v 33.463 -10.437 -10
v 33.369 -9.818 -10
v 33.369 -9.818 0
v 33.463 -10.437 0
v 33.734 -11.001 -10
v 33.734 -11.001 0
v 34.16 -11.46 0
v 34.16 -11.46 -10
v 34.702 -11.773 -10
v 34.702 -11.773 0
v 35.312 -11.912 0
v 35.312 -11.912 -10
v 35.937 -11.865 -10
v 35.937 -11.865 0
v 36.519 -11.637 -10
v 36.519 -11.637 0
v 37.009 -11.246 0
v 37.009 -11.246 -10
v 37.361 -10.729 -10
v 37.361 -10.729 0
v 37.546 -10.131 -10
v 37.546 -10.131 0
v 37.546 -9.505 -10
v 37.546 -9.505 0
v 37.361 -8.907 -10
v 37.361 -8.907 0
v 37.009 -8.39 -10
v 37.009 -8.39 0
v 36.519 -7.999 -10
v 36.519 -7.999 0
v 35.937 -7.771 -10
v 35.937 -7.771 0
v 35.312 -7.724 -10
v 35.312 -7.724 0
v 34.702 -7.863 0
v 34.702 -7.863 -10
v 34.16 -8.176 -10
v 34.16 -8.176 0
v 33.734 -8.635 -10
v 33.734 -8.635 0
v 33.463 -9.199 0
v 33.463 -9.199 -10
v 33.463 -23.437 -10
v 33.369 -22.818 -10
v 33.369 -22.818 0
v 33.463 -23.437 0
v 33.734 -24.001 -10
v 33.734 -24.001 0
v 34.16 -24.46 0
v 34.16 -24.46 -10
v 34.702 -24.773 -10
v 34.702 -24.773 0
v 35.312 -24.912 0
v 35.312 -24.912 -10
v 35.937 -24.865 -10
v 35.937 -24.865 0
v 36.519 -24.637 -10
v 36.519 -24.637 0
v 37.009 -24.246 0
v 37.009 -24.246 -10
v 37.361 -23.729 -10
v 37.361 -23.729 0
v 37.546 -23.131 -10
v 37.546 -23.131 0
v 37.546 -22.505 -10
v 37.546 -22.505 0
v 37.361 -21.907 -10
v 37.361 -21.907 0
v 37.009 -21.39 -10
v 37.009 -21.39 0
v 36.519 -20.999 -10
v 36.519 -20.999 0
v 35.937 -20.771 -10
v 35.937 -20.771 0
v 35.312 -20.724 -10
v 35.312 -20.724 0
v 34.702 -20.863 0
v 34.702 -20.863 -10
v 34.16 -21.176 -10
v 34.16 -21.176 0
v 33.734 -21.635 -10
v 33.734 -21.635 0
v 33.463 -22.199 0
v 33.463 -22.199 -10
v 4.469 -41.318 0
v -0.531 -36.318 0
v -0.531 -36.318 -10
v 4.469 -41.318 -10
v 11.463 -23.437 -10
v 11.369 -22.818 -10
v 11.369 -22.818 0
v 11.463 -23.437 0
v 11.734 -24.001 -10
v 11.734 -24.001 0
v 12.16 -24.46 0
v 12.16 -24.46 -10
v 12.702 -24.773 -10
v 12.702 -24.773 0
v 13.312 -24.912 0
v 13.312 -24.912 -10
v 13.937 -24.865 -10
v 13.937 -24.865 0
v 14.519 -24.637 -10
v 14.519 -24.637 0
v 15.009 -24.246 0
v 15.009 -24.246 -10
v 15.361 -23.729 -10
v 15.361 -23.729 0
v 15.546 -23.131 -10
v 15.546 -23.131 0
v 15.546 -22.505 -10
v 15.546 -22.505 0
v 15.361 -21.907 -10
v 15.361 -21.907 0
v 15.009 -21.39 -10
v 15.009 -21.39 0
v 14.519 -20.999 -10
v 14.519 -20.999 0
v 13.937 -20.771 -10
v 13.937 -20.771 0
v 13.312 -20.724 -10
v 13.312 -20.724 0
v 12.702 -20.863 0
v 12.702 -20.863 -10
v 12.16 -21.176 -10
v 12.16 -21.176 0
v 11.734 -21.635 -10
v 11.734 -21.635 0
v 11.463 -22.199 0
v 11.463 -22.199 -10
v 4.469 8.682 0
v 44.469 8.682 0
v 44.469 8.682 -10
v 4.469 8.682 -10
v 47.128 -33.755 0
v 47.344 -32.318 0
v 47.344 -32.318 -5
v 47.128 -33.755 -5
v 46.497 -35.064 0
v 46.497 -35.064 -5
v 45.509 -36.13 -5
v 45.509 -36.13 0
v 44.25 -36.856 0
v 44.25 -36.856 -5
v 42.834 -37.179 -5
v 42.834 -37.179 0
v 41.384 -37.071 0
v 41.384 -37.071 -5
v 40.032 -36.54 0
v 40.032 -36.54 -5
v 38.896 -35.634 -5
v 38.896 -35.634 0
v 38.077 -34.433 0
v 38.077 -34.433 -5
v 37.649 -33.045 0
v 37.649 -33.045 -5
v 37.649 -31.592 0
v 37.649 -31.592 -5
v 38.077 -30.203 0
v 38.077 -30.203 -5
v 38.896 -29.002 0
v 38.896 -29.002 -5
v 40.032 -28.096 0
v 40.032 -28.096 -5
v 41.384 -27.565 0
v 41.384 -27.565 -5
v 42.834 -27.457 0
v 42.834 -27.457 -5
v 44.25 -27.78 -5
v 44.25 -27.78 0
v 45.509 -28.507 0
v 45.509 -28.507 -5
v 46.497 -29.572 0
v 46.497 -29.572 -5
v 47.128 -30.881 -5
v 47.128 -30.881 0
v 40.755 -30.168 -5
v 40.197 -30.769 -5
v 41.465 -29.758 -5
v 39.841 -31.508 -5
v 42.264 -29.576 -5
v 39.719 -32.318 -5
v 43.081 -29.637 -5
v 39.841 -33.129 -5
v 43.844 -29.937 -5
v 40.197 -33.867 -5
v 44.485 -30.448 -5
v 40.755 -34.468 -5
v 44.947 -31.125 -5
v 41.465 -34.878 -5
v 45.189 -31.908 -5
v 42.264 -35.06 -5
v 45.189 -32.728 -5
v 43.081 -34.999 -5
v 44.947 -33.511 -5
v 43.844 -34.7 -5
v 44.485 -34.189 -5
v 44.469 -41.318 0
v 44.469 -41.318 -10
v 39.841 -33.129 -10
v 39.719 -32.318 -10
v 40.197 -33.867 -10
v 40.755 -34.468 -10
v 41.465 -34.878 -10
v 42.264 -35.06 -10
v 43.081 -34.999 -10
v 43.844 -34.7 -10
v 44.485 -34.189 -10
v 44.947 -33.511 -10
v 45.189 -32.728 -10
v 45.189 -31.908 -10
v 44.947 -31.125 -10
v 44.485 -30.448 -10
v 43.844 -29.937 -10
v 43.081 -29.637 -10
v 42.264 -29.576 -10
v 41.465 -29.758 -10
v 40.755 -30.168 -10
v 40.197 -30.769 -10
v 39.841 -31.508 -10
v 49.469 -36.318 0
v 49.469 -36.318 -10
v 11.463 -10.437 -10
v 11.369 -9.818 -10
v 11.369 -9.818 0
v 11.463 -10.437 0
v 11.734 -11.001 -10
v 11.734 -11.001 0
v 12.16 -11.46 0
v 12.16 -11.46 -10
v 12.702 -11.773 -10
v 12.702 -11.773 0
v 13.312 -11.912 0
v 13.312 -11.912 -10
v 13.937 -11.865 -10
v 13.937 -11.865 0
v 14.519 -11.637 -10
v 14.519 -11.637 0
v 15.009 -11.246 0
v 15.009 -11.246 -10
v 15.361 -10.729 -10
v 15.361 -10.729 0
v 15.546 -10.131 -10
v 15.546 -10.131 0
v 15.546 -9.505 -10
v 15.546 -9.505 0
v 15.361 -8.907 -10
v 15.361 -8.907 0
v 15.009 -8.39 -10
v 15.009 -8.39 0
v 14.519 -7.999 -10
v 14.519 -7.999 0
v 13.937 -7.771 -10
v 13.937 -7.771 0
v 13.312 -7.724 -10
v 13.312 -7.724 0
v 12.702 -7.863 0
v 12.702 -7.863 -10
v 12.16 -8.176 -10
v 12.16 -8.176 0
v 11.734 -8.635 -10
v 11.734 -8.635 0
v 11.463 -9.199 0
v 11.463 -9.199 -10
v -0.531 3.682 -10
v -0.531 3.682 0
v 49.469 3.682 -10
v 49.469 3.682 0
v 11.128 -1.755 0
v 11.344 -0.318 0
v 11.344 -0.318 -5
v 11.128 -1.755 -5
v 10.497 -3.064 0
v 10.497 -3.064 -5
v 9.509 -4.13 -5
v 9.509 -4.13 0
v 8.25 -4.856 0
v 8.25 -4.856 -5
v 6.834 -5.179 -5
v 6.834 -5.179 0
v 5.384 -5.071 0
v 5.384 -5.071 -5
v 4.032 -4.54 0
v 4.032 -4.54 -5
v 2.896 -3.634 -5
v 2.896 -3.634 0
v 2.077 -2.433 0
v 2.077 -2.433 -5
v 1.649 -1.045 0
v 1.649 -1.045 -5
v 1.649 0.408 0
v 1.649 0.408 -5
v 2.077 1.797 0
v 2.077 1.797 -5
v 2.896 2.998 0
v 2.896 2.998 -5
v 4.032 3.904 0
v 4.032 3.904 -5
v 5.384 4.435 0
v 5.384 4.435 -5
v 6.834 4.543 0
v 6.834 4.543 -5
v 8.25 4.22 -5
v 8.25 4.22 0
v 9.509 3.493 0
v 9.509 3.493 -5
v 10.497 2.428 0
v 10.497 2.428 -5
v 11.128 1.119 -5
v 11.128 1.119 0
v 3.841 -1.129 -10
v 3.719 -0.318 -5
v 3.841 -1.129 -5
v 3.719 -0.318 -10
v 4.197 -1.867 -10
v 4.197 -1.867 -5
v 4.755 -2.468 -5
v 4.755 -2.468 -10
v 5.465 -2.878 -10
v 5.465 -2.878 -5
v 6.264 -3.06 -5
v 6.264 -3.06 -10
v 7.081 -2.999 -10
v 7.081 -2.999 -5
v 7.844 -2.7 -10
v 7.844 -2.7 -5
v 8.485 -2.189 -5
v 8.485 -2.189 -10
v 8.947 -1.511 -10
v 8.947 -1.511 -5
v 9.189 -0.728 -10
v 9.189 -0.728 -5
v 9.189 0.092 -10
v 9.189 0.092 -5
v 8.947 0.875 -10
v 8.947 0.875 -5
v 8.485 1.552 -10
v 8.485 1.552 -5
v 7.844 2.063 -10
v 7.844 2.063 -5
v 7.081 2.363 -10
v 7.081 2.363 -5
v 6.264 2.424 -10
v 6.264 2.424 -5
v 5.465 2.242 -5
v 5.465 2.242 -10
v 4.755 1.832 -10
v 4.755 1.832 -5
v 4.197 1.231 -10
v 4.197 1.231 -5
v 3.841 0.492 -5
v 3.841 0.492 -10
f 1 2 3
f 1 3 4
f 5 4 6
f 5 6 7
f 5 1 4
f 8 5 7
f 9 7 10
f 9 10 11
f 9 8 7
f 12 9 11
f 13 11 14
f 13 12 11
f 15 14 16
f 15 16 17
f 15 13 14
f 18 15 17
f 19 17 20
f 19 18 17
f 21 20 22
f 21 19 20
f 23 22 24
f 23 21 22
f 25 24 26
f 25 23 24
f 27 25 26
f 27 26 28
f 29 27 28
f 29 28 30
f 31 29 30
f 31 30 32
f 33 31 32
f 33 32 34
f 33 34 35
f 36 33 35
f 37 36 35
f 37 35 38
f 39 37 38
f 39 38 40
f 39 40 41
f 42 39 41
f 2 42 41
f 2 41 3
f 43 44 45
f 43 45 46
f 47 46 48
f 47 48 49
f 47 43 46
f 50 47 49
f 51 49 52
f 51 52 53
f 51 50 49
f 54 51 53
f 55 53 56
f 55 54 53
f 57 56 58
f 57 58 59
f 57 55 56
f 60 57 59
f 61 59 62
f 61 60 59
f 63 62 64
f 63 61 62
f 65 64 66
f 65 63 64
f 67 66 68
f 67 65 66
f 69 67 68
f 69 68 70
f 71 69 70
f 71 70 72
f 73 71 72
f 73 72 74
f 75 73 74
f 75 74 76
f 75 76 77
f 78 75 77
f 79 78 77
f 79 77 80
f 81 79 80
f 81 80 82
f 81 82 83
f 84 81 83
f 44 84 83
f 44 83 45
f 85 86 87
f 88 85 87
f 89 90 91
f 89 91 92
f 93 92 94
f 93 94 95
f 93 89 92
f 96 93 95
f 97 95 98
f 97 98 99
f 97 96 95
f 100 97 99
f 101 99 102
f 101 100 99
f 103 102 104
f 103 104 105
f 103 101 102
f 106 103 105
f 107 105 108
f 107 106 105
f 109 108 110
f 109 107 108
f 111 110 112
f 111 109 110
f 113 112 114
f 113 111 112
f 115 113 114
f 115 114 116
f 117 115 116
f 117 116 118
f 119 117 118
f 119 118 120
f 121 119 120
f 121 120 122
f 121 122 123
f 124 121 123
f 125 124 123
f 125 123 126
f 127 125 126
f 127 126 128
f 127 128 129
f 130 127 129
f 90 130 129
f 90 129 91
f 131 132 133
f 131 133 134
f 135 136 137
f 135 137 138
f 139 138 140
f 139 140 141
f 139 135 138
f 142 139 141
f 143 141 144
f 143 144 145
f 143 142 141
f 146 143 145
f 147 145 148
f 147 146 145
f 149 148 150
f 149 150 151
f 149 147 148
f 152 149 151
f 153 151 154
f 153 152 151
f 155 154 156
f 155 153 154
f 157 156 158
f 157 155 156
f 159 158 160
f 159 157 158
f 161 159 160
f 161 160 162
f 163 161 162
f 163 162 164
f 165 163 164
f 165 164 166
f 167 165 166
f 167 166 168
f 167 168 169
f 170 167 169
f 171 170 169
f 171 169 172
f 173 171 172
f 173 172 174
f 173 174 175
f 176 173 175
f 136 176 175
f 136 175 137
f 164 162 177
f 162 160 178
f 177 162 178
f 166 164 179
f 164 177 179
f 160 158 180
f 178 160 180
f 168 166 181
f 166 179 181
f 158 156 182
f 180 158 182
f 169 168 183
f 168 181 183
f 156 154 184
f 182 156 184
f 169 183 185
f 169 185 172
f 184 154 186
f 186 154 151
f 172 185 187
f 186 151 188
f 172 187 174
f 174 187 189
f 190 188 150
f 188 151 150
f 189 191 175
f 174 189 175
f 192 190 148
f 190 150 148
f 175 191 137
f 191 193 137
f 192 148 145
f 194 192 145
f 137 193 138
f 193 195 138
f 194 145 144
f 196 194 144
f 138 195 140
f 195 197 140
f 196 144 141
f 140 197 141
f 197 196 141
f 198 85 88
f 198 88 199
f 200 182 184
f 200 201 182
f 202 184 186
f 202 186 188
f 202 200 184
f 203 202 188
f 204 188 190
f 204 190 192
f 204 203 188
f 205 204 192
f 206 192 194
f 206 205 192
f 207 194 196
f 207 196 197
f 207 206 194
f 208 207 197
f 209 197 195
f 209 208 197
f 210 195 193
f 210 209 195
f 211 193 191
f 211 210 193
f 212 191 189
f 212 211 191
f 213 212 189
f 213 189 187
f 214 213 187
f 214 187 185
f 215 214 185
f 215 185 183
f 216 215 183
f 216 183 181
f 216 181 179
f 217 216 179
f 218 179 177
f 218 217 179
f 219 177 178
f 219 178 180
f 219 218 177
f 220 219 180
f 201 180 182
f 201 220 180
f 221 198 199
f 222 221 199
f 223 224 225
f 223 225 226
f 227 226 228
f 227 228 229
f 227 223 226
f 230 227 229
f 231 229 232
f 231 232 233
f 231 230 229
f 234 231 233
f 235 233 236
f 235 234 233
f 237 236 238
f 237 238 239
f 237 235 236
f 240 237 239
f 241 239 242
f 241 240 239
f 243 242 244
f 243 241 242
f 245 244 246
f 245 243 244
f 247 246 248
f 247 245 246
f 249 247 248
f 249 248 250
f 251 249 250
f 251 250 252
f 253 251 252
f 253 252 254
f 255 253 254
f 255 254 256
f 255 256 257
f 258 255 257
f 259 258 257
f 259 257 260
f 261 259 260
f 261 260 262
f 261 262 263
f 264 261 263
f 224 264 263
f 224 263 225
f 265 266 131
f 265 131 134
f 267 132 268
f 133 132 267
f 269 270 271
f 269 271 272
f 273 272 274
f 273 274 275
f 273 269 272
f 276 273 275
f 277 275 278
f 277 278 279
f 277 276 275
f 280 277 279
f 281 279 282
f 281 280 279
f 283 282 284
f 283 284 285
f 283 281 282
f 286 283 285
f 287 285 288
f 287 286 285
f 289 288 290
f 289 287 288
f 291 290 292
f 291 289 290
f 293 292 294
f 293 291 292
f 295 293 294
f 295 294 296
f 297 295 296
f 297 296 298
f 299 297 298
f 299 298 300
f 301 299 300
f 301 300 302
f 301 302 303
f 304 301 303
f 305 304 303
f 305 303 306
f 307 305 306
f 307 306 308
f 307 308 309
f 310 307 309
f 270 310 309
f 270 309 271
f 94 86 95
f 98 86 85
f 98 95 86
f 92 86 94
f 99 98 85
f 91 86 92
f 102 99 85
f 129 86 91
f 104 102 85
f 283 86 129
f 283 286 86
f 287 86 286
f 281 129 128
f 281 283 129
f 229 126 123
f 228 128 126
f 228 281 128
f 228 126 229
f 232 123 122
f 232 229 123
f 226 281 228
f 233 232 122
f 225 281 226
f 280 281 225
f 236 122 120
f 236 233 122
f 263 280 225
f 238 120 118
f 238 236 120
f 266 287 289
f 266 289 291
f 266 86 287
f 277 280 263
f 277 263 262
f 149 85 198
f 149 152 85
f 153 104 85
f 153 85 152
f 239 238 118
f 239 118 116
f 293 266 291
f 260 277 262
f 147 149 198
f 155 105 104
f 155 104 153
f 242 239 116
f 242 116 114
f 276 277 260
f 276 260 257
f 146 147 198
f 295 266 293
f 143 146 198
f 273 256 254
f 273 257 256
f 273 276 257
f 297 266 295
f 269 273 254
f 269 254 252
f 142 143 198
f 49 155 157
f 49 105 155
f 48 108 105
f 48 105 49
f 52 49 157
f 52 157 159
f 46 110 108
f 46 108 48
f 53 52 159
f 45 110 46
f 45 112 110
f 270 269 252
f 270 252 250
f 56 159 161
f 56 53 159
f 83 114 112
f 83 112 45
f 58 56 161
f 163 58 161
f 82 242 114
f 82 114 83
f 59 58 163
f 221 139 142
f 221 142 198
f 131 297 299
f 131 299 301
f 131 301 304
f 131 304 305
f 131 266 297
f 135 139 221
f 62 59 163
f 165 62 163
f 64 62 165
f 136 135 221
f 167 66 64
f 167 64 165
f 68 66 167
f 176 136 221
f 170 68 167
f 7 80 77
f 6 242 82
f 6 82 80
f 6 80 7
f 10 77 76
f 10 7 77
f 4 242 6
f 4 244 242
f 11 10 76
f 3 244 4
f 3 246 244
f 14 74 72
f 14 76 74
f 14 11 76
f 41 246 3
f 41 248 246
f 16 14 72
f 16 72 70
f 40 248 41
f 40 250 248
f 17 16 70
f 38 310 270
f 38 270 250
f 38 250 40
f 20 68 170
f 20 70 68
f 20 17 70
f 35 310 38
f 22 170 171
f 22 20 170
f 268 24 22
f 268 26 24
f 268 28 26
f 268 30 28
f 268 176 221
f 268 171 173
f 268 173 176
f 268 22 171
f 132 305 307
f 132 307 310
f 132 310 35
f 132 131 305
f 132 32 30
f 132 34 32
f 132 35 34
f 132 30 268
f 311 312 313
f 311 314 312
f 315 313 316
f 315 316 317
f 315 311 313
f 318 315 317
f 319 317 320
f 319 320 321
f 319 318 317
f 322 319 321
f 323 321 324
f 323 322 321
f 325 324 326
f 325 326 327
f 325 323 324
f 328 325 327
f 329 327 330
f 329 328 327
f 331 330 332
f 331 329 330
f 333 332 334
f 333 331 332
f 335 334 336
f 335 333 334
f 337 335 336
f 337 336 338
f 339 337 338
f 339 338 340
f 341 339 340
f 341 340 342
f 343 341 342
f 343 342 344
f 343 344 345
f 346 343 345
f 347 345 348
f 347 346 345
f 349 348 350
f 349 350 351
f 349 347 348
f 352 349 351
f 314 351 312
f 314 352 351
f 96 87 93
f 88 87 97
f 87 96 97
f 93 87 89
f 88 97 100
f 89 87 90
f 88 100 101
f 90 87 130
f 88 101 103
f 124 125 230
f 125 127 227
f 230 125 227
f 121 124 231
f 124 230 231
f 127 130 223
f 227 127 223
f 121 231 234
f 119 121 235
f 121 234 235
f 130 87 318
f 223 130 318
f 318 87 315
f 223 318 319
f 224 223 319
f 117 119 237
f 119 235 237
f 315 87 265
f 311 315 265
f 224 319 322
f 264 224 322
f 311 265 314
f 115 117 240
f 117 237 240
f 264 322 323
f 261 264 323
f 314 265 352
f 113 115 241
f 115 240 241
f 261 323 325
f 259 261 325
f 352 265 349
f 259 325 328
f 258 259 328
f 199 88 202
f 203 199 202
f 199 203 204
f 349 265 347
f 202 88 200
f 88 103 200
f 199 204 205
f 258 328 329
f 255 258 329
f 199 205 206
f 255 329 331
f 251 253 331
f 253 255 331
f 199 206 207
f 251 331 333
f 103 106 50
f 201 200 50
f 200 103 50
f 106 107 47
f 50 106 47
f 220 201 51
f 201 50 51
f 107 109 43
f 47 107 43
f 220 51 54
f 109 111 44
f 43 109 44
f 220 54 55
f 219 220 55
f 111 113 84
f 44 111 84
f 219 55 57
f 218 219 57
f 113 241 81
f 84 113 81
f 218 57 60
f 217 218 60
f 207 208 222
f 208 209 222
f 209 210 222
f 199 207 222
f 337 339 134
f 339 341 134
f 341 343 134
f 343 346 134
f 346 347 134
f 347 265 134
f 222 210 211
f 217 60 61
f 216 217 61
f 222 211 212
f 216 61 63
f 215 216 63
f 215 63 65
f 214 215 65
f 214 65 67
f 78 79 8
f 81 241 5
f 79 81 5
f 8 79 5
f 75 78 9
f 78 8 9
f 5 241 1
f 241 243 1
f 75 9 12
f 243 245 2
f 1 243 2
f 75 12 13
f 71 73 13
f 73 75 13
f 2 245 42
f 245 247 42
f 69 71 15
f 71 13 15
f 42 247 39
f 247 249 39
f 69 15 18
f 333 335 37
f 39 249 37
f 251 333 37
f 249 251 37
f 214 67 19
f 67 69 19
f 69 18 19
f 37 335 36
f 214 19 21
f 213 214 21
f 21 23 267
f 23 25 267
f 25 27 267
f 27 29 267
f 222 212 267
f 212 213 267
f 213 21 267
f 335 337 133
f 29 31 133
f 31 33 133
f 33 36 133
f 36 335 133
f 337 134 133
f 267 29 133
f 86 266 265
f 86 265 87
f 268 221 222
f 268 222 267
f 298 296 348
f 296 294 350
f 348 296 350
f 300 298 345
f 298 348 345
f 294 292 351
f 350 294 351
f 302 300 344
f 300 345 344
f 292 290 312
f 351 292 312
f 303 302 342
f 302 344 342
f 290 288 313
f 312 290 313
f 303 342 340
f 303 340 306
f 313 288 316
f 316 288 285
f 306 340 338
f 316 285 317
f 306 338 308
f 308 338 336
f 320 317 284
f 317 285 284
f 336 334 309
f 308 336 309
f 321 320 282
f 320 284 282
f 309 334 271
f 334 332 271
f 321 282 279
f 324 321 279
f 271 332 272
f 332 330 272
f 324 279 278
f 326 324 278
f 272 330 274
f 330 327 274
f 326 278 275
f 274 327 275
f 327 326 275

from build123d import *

# Parameters (mm, degrees)
F0_W           = 7
F0_H           = 9
F0_H_2         = 13
F0_W_2         = 22
F0_H_3         = 9.5
F1_DEPTH       = 10
F2_D           = 4.2
F3_SIZE        = 5
F4_D           = 5.5
F4_CBORE_D     = 9.75
F4_CBORE_DEPTH = 5


with BuildPart() as f1:
    # F0 (on Top) → F1 (new body)
    with BuildSketch(Plane.XY):
        with Locations((45.9692735374, -36.8180999458)):
            Rectangle(F0_W, F0_H)
        with Locations((45.9692735374, -16.3180999458)):
            Rectangle(F0_W, F0_H_2)
        with Locations((45.9692735374, 4.1819000542)):
            Rectangle(F0_W, F0_H)
        with Locations((24.4692735374, 4.1819000542)):
            Rectangle(F0_W_2, F0_H)
        with Locations((2.9692735374, 4.1819000542)):
            Rectangle(F0_W, F0_H)
        with Locations((2.9692735374, -16.3180999458)):
            Rectangle(F0_W, F0_H_2)
        with Locations((24.4692735374, -16.3180999458)):
            Rectangle(F0_W_2, F0_H_2)
        with Locations((24.4692735374, -36.8180999458)):
            Rectangle(F0_W_2, F0_H)
        with Locations((2.9692735374, -36.8180999458)):
            Rectangle(F0_W, F0_H)
        with Locations((2.9692735374, -5.0680999458)):
            Rectangle(F0_W, F0_H_3)
        with Locations((9.9692735374, -5.0680999458)):
            Rectangle(F0_W, F0_H_3)
        with Locations((9.9692735374, 4.1819000542)):
            Rectangle(F0_W, F0_H)
        with Locations((24.4692735374, -5.0680999458)):
            Rectangle(F0_W_2, F0_H_3)
        with Locations((38.9692735374, -5.0680999458)):
            Rectangle(F0_W, F0_H_3)
        with Locations((38.9692735374, 4.1819000542)):
            Rectangle(F0_W, F0_H)
        with Locations((45.9692735374, -5.0680999458)):
            Rectangle(F0_W, F0_H_3)
        with Locations((38.9692735374, -16.3180999458)):
            Rectangle(F0_W, F0_H_2)
        with Locations((9.9692735374, -16.3180999458)):
            Rectangle(F0_W, F0_H_2)
        with Locations((2.9692735374, -27.5680999458)):
            Rectangle(F0_W, F0_H_3)
        with Locations((9.9692735374, -27.5680999458)):
            Rectangle(F0_W, F0_H_3)
        with Locations((24.4692735374, -27.5680999458)):
            Rectangle(F0_W_2, F0_H_3)
        with Locations((38.9692735374, -27.5680999458)):
            Rectangle(F0_W, F0_H_3)
        with Locations((45.9692735374, -27.5680999458)):
            Rectangle(F0_W, F0_H_3)
        with Locations((9.9692735374, -36.8180999458)):
            Rectangle(F0_W, F0_H)
        with Locations((38.9692735374, -36.8180999458)):
            Rectangle(F0_W, F0_H)
    extrude(amount=F1_DEPTH)

    # F2 (through all)
    with Locations(Plane(origin=(0, 0, 0), x_dir=(1, 0, 0), z_dir=(0, 0, -1))):
        with Locations((13.4692735374, 9.8180999458), (35.4692735374, 9.8180999458), (35.4692735374, 22.8180999458), (13.4692735374, 22.8180999458)):
            Hole(F2_D / 2)

    # F3
    f3_edges = [f1.edges().sort_by_distance(p)[0] for p in [
        (49.469274, 8.6819, 5),
        (49.469274, -41.3181, 5),
        (-0.530726, -41.3181, 5),
        (-0.530726, 8.6819, 5),
    ]]
    chamfer(f3_edges, length=F3_SIZE)

    # F4 (through all)
    with Locations(Plane(origin=(0, 0, 0), x_dir=(1, 0, 0), z_dir=(0, 0, -1))):
        with Locations((6.4692735374, 0.3180999458), (42.4692735374, 32.3180999458)):
            CounterBoreHole(F4_D / 2, F4_CBORE_D / 2, F4_CBORE_DEPTH)


with BuildPart() as f5_1:
    # F5: instance of F1
    add(f1.part.mirror(Plane.XY))


solid = f5_1.part
